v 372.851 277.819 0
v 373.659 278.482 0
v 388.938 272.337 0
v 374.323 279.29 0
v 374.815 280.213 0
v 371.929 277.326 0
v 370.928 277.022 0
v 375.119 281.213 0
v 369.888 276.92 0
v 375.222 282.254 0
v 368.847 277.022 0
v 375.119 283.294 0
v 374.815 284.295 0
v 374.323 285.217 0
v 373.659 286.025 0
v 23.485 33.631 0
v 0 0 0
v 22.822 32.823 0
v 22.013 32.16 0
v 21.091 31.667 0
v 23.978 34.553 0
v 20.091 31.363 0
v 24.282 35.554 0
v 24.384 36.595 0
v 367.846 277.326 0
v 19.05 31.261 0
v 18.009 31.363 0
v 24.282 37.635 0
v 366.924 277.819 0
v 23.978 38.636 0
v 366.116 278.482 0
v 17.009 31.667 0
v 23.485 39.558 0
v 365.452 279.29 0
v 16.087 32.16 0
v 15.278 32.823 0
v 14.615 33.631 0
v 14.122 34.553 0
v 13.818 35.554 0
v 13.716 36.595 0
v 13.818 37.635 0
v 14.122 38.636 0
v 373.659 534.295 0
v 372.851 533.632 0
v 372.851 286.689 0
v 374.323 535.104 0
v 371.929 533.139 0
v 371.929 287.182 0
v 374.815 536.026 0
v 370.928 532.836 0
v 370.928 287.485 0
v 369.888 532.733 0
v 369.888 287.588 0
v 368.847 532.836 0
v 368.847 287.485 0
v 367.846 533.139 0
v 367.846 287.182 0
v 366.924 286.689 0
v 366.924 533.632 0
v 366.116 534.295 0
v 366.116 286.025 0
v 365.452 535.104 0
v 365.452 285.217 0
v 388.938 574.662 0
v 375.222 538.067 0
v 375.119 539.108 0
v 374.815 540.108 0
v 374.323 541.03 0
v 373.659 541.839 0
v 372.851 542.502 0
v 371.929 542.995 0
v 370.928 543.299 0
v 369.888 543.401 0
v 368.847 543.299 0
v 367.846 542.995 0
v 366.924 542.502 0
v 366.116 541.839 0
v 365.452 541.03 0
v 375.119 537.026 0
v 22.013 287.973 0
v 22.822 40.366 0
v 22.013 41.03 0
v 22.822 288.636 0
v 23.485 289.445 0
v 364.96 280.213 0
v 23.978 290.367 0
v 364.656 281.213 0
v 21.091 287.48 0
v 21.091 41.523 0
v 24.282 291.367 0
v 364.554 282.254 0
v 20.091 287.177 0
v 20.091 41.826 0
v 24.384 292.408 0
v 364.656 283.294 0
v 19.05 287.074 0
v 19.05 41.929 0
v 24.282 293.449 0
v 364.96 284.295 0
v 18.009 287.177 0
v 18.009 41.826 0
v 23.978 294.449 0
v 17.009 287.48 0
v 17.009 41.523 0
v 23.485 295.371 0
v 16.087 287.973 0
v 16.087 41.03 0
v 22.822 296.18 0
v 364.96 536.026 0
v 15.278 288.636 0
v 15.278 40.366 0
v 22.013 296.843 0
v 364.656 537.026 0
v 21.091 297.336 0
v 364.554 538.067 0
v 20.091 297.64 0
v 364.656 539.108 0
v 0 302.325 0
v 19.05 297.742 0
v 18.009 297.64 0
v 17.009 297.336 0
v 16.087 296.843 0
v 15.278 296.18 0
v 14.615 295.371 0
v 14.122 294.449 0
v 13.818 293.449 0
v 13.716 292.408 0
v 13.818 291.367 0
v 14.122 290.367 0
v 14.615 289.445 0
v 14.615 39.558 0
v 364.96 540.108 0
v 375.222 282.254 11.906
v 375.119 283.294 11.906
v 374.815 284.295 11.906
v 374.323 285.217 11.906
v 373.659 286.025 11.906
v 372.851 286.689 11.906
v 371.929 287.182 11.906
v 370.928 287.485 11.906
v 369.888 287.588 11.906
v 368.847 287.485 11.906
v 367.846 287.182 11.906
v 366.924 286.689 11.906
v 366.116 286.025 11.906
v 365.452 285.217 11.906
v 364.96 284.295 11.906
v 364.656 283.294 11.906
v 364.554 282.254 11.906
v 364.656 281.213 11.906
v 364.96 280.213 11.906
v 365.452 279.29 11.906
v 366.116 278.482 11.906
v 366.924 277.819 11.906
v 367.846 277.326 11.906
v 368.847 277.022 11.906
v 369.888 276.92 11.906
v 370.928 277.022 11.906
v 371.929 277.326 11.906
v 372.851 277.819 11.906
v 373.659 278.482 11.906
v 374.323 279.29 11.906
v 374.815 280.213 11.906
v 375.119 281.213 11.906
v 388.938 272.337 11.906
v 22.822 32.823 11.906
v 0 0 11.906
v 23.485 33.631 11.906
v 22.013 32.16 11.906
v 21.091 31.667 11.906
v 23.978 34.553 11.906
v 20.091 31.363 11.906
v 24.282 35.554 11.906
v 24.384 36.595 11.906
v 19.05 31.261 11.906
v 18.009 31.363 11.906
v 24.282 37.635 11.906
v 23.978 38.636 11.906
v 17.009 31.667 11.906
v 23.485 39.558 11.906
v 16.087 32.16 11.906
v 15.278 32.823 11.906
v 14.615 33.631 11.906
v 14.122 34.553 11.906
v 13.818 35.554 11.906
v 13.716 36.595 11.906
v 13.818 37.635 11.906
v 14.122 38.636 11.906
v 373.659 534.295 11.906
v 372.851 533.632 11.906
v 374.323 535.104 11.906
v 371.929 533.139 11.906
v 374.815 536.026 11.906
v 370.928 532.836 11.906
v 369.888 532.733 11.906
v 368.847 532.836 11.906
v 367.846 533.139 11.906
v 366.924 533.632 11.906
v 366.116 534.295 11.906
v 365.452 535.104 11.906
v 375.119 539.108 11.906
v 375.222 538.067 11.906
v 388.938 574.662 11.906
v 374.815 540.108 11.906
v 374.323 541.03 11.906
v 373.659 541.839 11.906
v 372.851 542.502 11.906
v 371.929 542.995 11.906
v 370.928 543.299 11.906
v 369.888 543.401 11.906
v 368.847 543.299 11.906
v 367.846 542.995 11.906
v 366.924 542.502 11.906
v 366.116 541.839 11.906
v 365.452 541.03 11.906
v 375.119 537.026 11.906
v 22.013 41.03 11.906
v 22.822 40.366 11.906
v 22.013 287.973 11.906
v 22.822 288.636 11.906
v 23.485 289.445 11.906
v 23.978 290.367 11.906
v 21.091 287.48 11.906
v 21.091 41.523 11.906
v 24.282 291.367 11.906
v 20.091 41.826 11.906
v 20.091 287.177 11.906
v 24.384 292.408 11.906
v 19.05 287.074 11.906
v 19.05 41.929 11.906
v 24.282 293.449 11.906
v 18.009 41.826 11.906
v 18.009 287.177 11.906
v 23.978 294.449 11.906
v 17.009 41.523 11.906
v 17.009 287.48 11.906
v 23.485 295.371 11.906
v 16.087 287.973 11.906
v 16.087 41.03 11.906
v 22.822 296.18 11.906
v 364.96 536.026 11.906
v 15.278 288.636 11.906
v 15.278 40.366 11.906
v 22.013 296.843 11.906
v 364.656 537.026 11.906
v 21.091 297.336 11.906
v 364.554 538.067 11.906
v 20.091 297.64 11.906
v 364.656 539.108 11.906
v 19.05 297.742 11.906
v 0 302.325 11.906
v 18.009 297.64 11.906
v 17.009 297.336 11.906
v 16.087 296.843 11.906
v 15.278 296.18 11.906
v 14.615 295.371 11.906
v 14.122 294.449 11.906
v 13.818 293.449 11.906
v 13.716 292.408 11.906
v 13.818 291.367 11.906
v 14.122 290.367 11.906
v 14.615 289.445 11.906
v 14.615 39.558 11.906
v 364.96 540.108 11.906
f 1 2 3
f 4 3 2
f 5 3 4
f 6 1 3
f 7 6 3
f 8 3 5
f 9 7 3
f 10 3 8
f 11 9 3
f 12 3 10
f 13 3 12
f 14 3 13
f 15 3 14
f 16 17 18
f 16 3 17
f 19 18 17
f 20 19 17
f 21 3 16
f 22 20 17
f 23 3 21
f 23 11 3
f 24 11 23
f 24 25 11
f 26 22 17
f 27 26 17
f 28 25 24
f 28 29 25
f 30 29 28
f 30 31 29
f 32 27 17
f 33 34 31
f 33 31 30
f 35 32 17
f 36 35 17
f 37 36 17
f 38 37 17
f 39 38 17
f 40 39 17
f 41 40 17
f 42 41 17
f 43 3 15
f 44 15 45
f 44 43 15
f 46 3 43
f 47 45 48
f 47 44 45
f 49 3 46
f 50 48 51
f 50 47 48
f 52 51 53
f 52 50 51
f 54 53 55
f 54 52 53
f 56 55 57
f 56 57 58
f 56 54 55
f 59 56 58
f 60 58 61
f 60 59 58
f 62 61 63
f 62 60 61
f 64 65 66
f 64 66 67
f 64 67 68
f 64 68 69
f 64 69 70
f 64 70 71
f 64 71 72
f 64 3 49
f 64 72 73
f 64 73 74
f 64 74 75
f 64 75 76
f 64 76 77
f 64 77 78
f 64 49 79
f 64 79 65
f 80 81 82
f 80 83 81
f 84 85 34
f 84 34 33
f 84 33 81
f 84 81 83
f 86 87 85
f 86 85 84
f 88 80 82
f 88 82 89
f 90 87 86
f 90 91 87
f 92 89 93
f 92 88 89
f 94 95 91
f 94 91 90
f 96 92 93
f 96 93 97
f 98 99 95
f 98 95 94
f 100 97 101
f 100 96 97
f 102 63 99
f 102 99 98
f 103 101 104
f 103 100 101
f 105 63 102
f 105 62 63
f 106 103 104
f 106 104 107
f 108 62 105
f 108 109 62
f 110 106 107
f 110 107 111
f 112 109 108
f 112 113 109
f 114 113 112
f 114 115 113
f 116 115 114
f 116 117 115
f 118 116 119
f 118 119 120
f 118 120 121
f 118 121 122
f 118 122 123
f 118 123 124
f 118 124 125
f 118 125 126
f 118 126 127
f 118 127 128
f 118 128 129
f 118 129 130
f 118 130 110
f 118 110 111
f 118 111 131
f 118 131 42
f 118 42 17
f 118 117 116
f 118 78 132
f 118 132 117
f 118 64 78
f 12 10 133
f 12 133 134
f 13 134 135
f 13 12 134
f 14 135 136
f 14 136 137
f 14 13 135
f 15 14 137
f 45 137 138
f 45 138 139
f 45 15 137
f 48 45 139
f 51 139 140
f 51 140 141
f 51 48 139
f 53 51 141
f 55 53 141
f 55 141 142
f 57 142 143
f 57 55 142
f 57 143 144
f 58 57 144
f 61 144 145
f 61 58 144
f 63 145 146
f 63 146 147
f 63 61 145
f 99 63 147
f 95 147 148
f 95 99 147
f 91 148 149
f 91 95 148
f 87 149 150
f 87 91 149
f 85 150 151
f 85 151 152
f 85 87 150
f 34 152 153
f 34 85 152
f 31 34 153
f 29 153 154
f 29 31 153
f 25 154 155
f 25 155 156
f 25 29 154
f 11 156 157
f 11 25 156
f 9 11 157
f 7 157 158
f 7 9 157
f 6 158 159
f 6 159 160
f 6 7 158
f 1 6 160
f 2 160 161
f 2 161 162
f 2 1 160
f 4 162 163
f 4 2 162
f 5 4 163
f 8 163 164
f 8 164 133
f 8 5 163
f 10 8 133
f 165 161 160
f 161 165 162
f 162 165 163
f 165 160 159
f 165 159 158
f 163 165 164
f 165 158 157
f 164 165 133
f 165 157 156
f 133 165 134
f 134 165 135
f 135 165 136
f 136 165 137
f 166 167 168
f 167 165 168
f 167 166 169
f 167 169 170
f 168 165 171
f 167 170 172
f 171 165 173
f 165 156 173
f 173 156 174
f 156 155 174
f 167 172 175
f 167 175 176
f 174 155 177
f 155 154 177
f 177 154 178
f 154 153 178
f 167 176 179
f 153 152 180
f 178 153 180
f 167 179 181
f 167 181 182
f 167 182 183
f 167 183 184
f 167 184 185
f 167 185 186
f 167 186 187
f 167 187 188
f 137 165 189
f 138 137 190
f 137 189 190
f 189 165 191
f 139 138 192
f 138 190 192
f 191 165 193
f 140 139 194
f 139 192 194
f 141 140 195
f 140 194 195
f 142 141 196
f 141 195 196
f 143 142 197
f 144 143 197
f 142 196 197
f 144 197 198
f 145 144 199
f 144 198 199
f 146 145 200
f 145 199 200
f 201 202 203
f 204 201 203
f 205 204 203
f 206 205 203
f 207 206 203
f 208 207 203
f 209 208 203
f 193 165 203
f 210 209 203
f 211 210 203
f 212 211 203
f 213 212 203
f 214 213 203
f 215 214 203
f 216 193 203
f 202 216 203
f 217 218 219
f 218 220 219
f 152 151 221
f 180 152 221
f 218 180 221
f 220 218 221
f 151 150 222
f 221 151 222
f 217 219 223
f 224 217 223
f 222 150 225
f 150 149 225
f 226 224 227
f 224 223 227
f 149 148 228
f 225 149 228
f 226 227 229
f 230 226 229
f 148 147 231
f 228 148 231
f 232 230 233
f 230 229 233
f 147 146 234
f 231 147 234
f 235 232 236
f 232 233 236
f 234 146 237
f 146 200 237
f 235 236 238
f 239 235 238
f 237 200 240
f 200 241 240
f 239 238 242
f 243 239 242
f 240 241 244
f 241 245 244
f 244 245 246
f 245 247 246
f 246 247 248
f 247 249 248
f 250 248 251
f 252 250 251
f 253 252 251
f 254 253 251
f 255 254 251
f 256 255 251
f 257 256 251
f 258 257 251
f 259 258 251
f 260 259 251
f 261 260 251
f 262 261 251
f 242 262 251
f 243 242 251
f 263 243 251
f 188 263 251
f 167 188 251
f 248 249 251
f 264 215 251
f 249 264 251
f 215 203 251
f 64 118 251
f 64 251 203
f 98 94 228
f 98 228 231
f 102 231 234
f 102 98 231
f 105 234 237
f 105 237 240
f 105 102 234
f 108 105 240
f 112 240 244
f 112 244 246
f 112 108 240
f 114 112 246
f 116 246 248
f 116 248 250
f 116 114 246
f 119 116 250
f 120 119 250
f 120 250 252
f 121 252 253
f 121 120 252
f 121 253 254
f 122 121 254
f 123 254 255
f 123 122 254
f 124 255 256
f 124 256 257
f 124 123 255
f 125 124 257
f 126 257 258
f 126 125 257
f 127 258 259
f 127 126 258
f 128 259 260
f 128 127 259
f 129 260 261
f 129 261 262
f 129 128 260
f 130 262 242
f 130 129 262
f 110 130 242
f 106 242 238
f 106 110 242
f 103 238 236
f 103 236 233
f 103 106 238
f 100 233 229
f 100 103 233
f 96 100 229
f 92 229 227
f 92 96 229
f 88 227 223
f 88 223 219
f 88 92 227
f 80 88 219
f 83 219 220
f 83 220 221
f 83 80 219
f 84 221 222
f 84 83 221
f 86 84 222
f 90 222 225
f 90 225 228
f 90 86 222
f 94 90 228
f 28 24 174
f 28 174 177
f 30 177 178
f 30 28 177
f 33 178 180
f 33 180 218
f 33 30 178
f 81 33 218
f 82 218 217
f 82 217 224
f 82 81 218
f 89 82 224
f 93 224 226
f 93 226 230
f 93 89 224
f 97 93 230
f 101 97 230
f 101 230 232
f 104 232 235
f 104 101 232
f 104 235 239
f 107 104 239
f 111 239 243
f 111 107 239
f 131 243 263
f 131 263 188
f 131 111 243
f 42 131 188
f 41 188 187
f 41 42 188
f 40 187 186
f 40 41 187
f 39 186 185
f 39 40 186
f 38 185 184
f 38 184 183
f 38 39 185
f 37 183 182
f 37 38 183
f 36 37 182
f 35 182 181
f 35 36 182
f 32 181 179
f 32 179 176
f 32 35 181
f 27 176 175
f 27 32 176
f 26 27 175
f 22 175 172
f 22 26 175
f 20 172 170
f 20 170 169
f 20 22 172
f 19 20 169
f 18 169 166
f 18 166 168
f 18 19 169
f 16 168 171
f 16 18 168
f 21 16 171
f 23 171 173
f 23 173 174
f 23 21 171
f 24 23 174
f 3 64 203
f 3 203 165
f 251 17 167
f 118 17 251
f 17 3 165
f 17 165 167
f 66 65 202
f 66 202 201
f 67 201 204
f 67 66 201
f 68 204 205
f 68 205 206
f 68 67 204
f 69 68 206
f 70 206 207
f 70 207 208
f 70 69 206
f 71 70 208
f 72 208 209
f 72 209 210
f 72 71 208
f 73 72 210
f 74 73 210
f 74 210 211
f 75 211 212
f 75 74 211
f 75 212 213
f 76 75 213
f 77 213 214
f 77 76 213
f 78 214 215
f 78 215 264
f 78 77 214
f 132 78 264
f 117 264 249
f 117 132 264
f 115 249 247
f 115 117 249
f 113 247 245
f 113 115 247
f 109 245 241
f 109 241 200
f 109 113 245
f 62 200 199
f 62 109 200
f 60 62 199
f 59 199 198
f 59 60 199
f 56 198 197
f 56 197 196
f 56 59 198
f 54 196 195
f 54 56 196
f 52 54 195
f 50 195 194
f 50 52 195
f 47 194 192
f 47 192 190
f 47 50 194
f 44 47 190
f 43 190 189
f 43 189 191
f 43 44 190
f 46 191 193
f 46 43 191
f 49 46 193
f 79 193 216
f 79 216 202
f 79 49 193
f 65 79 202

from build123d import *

# Parameters (mm, degrees)
SKETCH1_R           = 5.334
BOSS_EXTRUDE1_DEPTH = 11.90625


with BuildPart() as part:
    # Sketch1 → Boss-Extrude1 (new body)
    with BuildSketch(Plane.XY):
        Polygon((0, 0), (0, 302.324826907), (388.9375, 574.661796299), (388.9375, 272.336969392), align=None)
        with Locations((19.05, 292.408024594)):
            Circle(SKETCH1_R, mode=Mode.SUBTRACT)
        with Locations((19.05, 36.594709519)):
            Circle(SKETCH1_R, mode=Mode.SUBTRACT)
        with Locations((369.8875, 282.253771705)):
            Circle(SKETCH1_R, mode=Mode.SUBTRACT)
        with Locations((369.8875, 538.06708678)):
            Circle(SKETCH1_R, mode=Mode.SUBTRACT)
    extrude(amount=BOSS_EXTRUDE1_DEPTH)


solid = part.part
